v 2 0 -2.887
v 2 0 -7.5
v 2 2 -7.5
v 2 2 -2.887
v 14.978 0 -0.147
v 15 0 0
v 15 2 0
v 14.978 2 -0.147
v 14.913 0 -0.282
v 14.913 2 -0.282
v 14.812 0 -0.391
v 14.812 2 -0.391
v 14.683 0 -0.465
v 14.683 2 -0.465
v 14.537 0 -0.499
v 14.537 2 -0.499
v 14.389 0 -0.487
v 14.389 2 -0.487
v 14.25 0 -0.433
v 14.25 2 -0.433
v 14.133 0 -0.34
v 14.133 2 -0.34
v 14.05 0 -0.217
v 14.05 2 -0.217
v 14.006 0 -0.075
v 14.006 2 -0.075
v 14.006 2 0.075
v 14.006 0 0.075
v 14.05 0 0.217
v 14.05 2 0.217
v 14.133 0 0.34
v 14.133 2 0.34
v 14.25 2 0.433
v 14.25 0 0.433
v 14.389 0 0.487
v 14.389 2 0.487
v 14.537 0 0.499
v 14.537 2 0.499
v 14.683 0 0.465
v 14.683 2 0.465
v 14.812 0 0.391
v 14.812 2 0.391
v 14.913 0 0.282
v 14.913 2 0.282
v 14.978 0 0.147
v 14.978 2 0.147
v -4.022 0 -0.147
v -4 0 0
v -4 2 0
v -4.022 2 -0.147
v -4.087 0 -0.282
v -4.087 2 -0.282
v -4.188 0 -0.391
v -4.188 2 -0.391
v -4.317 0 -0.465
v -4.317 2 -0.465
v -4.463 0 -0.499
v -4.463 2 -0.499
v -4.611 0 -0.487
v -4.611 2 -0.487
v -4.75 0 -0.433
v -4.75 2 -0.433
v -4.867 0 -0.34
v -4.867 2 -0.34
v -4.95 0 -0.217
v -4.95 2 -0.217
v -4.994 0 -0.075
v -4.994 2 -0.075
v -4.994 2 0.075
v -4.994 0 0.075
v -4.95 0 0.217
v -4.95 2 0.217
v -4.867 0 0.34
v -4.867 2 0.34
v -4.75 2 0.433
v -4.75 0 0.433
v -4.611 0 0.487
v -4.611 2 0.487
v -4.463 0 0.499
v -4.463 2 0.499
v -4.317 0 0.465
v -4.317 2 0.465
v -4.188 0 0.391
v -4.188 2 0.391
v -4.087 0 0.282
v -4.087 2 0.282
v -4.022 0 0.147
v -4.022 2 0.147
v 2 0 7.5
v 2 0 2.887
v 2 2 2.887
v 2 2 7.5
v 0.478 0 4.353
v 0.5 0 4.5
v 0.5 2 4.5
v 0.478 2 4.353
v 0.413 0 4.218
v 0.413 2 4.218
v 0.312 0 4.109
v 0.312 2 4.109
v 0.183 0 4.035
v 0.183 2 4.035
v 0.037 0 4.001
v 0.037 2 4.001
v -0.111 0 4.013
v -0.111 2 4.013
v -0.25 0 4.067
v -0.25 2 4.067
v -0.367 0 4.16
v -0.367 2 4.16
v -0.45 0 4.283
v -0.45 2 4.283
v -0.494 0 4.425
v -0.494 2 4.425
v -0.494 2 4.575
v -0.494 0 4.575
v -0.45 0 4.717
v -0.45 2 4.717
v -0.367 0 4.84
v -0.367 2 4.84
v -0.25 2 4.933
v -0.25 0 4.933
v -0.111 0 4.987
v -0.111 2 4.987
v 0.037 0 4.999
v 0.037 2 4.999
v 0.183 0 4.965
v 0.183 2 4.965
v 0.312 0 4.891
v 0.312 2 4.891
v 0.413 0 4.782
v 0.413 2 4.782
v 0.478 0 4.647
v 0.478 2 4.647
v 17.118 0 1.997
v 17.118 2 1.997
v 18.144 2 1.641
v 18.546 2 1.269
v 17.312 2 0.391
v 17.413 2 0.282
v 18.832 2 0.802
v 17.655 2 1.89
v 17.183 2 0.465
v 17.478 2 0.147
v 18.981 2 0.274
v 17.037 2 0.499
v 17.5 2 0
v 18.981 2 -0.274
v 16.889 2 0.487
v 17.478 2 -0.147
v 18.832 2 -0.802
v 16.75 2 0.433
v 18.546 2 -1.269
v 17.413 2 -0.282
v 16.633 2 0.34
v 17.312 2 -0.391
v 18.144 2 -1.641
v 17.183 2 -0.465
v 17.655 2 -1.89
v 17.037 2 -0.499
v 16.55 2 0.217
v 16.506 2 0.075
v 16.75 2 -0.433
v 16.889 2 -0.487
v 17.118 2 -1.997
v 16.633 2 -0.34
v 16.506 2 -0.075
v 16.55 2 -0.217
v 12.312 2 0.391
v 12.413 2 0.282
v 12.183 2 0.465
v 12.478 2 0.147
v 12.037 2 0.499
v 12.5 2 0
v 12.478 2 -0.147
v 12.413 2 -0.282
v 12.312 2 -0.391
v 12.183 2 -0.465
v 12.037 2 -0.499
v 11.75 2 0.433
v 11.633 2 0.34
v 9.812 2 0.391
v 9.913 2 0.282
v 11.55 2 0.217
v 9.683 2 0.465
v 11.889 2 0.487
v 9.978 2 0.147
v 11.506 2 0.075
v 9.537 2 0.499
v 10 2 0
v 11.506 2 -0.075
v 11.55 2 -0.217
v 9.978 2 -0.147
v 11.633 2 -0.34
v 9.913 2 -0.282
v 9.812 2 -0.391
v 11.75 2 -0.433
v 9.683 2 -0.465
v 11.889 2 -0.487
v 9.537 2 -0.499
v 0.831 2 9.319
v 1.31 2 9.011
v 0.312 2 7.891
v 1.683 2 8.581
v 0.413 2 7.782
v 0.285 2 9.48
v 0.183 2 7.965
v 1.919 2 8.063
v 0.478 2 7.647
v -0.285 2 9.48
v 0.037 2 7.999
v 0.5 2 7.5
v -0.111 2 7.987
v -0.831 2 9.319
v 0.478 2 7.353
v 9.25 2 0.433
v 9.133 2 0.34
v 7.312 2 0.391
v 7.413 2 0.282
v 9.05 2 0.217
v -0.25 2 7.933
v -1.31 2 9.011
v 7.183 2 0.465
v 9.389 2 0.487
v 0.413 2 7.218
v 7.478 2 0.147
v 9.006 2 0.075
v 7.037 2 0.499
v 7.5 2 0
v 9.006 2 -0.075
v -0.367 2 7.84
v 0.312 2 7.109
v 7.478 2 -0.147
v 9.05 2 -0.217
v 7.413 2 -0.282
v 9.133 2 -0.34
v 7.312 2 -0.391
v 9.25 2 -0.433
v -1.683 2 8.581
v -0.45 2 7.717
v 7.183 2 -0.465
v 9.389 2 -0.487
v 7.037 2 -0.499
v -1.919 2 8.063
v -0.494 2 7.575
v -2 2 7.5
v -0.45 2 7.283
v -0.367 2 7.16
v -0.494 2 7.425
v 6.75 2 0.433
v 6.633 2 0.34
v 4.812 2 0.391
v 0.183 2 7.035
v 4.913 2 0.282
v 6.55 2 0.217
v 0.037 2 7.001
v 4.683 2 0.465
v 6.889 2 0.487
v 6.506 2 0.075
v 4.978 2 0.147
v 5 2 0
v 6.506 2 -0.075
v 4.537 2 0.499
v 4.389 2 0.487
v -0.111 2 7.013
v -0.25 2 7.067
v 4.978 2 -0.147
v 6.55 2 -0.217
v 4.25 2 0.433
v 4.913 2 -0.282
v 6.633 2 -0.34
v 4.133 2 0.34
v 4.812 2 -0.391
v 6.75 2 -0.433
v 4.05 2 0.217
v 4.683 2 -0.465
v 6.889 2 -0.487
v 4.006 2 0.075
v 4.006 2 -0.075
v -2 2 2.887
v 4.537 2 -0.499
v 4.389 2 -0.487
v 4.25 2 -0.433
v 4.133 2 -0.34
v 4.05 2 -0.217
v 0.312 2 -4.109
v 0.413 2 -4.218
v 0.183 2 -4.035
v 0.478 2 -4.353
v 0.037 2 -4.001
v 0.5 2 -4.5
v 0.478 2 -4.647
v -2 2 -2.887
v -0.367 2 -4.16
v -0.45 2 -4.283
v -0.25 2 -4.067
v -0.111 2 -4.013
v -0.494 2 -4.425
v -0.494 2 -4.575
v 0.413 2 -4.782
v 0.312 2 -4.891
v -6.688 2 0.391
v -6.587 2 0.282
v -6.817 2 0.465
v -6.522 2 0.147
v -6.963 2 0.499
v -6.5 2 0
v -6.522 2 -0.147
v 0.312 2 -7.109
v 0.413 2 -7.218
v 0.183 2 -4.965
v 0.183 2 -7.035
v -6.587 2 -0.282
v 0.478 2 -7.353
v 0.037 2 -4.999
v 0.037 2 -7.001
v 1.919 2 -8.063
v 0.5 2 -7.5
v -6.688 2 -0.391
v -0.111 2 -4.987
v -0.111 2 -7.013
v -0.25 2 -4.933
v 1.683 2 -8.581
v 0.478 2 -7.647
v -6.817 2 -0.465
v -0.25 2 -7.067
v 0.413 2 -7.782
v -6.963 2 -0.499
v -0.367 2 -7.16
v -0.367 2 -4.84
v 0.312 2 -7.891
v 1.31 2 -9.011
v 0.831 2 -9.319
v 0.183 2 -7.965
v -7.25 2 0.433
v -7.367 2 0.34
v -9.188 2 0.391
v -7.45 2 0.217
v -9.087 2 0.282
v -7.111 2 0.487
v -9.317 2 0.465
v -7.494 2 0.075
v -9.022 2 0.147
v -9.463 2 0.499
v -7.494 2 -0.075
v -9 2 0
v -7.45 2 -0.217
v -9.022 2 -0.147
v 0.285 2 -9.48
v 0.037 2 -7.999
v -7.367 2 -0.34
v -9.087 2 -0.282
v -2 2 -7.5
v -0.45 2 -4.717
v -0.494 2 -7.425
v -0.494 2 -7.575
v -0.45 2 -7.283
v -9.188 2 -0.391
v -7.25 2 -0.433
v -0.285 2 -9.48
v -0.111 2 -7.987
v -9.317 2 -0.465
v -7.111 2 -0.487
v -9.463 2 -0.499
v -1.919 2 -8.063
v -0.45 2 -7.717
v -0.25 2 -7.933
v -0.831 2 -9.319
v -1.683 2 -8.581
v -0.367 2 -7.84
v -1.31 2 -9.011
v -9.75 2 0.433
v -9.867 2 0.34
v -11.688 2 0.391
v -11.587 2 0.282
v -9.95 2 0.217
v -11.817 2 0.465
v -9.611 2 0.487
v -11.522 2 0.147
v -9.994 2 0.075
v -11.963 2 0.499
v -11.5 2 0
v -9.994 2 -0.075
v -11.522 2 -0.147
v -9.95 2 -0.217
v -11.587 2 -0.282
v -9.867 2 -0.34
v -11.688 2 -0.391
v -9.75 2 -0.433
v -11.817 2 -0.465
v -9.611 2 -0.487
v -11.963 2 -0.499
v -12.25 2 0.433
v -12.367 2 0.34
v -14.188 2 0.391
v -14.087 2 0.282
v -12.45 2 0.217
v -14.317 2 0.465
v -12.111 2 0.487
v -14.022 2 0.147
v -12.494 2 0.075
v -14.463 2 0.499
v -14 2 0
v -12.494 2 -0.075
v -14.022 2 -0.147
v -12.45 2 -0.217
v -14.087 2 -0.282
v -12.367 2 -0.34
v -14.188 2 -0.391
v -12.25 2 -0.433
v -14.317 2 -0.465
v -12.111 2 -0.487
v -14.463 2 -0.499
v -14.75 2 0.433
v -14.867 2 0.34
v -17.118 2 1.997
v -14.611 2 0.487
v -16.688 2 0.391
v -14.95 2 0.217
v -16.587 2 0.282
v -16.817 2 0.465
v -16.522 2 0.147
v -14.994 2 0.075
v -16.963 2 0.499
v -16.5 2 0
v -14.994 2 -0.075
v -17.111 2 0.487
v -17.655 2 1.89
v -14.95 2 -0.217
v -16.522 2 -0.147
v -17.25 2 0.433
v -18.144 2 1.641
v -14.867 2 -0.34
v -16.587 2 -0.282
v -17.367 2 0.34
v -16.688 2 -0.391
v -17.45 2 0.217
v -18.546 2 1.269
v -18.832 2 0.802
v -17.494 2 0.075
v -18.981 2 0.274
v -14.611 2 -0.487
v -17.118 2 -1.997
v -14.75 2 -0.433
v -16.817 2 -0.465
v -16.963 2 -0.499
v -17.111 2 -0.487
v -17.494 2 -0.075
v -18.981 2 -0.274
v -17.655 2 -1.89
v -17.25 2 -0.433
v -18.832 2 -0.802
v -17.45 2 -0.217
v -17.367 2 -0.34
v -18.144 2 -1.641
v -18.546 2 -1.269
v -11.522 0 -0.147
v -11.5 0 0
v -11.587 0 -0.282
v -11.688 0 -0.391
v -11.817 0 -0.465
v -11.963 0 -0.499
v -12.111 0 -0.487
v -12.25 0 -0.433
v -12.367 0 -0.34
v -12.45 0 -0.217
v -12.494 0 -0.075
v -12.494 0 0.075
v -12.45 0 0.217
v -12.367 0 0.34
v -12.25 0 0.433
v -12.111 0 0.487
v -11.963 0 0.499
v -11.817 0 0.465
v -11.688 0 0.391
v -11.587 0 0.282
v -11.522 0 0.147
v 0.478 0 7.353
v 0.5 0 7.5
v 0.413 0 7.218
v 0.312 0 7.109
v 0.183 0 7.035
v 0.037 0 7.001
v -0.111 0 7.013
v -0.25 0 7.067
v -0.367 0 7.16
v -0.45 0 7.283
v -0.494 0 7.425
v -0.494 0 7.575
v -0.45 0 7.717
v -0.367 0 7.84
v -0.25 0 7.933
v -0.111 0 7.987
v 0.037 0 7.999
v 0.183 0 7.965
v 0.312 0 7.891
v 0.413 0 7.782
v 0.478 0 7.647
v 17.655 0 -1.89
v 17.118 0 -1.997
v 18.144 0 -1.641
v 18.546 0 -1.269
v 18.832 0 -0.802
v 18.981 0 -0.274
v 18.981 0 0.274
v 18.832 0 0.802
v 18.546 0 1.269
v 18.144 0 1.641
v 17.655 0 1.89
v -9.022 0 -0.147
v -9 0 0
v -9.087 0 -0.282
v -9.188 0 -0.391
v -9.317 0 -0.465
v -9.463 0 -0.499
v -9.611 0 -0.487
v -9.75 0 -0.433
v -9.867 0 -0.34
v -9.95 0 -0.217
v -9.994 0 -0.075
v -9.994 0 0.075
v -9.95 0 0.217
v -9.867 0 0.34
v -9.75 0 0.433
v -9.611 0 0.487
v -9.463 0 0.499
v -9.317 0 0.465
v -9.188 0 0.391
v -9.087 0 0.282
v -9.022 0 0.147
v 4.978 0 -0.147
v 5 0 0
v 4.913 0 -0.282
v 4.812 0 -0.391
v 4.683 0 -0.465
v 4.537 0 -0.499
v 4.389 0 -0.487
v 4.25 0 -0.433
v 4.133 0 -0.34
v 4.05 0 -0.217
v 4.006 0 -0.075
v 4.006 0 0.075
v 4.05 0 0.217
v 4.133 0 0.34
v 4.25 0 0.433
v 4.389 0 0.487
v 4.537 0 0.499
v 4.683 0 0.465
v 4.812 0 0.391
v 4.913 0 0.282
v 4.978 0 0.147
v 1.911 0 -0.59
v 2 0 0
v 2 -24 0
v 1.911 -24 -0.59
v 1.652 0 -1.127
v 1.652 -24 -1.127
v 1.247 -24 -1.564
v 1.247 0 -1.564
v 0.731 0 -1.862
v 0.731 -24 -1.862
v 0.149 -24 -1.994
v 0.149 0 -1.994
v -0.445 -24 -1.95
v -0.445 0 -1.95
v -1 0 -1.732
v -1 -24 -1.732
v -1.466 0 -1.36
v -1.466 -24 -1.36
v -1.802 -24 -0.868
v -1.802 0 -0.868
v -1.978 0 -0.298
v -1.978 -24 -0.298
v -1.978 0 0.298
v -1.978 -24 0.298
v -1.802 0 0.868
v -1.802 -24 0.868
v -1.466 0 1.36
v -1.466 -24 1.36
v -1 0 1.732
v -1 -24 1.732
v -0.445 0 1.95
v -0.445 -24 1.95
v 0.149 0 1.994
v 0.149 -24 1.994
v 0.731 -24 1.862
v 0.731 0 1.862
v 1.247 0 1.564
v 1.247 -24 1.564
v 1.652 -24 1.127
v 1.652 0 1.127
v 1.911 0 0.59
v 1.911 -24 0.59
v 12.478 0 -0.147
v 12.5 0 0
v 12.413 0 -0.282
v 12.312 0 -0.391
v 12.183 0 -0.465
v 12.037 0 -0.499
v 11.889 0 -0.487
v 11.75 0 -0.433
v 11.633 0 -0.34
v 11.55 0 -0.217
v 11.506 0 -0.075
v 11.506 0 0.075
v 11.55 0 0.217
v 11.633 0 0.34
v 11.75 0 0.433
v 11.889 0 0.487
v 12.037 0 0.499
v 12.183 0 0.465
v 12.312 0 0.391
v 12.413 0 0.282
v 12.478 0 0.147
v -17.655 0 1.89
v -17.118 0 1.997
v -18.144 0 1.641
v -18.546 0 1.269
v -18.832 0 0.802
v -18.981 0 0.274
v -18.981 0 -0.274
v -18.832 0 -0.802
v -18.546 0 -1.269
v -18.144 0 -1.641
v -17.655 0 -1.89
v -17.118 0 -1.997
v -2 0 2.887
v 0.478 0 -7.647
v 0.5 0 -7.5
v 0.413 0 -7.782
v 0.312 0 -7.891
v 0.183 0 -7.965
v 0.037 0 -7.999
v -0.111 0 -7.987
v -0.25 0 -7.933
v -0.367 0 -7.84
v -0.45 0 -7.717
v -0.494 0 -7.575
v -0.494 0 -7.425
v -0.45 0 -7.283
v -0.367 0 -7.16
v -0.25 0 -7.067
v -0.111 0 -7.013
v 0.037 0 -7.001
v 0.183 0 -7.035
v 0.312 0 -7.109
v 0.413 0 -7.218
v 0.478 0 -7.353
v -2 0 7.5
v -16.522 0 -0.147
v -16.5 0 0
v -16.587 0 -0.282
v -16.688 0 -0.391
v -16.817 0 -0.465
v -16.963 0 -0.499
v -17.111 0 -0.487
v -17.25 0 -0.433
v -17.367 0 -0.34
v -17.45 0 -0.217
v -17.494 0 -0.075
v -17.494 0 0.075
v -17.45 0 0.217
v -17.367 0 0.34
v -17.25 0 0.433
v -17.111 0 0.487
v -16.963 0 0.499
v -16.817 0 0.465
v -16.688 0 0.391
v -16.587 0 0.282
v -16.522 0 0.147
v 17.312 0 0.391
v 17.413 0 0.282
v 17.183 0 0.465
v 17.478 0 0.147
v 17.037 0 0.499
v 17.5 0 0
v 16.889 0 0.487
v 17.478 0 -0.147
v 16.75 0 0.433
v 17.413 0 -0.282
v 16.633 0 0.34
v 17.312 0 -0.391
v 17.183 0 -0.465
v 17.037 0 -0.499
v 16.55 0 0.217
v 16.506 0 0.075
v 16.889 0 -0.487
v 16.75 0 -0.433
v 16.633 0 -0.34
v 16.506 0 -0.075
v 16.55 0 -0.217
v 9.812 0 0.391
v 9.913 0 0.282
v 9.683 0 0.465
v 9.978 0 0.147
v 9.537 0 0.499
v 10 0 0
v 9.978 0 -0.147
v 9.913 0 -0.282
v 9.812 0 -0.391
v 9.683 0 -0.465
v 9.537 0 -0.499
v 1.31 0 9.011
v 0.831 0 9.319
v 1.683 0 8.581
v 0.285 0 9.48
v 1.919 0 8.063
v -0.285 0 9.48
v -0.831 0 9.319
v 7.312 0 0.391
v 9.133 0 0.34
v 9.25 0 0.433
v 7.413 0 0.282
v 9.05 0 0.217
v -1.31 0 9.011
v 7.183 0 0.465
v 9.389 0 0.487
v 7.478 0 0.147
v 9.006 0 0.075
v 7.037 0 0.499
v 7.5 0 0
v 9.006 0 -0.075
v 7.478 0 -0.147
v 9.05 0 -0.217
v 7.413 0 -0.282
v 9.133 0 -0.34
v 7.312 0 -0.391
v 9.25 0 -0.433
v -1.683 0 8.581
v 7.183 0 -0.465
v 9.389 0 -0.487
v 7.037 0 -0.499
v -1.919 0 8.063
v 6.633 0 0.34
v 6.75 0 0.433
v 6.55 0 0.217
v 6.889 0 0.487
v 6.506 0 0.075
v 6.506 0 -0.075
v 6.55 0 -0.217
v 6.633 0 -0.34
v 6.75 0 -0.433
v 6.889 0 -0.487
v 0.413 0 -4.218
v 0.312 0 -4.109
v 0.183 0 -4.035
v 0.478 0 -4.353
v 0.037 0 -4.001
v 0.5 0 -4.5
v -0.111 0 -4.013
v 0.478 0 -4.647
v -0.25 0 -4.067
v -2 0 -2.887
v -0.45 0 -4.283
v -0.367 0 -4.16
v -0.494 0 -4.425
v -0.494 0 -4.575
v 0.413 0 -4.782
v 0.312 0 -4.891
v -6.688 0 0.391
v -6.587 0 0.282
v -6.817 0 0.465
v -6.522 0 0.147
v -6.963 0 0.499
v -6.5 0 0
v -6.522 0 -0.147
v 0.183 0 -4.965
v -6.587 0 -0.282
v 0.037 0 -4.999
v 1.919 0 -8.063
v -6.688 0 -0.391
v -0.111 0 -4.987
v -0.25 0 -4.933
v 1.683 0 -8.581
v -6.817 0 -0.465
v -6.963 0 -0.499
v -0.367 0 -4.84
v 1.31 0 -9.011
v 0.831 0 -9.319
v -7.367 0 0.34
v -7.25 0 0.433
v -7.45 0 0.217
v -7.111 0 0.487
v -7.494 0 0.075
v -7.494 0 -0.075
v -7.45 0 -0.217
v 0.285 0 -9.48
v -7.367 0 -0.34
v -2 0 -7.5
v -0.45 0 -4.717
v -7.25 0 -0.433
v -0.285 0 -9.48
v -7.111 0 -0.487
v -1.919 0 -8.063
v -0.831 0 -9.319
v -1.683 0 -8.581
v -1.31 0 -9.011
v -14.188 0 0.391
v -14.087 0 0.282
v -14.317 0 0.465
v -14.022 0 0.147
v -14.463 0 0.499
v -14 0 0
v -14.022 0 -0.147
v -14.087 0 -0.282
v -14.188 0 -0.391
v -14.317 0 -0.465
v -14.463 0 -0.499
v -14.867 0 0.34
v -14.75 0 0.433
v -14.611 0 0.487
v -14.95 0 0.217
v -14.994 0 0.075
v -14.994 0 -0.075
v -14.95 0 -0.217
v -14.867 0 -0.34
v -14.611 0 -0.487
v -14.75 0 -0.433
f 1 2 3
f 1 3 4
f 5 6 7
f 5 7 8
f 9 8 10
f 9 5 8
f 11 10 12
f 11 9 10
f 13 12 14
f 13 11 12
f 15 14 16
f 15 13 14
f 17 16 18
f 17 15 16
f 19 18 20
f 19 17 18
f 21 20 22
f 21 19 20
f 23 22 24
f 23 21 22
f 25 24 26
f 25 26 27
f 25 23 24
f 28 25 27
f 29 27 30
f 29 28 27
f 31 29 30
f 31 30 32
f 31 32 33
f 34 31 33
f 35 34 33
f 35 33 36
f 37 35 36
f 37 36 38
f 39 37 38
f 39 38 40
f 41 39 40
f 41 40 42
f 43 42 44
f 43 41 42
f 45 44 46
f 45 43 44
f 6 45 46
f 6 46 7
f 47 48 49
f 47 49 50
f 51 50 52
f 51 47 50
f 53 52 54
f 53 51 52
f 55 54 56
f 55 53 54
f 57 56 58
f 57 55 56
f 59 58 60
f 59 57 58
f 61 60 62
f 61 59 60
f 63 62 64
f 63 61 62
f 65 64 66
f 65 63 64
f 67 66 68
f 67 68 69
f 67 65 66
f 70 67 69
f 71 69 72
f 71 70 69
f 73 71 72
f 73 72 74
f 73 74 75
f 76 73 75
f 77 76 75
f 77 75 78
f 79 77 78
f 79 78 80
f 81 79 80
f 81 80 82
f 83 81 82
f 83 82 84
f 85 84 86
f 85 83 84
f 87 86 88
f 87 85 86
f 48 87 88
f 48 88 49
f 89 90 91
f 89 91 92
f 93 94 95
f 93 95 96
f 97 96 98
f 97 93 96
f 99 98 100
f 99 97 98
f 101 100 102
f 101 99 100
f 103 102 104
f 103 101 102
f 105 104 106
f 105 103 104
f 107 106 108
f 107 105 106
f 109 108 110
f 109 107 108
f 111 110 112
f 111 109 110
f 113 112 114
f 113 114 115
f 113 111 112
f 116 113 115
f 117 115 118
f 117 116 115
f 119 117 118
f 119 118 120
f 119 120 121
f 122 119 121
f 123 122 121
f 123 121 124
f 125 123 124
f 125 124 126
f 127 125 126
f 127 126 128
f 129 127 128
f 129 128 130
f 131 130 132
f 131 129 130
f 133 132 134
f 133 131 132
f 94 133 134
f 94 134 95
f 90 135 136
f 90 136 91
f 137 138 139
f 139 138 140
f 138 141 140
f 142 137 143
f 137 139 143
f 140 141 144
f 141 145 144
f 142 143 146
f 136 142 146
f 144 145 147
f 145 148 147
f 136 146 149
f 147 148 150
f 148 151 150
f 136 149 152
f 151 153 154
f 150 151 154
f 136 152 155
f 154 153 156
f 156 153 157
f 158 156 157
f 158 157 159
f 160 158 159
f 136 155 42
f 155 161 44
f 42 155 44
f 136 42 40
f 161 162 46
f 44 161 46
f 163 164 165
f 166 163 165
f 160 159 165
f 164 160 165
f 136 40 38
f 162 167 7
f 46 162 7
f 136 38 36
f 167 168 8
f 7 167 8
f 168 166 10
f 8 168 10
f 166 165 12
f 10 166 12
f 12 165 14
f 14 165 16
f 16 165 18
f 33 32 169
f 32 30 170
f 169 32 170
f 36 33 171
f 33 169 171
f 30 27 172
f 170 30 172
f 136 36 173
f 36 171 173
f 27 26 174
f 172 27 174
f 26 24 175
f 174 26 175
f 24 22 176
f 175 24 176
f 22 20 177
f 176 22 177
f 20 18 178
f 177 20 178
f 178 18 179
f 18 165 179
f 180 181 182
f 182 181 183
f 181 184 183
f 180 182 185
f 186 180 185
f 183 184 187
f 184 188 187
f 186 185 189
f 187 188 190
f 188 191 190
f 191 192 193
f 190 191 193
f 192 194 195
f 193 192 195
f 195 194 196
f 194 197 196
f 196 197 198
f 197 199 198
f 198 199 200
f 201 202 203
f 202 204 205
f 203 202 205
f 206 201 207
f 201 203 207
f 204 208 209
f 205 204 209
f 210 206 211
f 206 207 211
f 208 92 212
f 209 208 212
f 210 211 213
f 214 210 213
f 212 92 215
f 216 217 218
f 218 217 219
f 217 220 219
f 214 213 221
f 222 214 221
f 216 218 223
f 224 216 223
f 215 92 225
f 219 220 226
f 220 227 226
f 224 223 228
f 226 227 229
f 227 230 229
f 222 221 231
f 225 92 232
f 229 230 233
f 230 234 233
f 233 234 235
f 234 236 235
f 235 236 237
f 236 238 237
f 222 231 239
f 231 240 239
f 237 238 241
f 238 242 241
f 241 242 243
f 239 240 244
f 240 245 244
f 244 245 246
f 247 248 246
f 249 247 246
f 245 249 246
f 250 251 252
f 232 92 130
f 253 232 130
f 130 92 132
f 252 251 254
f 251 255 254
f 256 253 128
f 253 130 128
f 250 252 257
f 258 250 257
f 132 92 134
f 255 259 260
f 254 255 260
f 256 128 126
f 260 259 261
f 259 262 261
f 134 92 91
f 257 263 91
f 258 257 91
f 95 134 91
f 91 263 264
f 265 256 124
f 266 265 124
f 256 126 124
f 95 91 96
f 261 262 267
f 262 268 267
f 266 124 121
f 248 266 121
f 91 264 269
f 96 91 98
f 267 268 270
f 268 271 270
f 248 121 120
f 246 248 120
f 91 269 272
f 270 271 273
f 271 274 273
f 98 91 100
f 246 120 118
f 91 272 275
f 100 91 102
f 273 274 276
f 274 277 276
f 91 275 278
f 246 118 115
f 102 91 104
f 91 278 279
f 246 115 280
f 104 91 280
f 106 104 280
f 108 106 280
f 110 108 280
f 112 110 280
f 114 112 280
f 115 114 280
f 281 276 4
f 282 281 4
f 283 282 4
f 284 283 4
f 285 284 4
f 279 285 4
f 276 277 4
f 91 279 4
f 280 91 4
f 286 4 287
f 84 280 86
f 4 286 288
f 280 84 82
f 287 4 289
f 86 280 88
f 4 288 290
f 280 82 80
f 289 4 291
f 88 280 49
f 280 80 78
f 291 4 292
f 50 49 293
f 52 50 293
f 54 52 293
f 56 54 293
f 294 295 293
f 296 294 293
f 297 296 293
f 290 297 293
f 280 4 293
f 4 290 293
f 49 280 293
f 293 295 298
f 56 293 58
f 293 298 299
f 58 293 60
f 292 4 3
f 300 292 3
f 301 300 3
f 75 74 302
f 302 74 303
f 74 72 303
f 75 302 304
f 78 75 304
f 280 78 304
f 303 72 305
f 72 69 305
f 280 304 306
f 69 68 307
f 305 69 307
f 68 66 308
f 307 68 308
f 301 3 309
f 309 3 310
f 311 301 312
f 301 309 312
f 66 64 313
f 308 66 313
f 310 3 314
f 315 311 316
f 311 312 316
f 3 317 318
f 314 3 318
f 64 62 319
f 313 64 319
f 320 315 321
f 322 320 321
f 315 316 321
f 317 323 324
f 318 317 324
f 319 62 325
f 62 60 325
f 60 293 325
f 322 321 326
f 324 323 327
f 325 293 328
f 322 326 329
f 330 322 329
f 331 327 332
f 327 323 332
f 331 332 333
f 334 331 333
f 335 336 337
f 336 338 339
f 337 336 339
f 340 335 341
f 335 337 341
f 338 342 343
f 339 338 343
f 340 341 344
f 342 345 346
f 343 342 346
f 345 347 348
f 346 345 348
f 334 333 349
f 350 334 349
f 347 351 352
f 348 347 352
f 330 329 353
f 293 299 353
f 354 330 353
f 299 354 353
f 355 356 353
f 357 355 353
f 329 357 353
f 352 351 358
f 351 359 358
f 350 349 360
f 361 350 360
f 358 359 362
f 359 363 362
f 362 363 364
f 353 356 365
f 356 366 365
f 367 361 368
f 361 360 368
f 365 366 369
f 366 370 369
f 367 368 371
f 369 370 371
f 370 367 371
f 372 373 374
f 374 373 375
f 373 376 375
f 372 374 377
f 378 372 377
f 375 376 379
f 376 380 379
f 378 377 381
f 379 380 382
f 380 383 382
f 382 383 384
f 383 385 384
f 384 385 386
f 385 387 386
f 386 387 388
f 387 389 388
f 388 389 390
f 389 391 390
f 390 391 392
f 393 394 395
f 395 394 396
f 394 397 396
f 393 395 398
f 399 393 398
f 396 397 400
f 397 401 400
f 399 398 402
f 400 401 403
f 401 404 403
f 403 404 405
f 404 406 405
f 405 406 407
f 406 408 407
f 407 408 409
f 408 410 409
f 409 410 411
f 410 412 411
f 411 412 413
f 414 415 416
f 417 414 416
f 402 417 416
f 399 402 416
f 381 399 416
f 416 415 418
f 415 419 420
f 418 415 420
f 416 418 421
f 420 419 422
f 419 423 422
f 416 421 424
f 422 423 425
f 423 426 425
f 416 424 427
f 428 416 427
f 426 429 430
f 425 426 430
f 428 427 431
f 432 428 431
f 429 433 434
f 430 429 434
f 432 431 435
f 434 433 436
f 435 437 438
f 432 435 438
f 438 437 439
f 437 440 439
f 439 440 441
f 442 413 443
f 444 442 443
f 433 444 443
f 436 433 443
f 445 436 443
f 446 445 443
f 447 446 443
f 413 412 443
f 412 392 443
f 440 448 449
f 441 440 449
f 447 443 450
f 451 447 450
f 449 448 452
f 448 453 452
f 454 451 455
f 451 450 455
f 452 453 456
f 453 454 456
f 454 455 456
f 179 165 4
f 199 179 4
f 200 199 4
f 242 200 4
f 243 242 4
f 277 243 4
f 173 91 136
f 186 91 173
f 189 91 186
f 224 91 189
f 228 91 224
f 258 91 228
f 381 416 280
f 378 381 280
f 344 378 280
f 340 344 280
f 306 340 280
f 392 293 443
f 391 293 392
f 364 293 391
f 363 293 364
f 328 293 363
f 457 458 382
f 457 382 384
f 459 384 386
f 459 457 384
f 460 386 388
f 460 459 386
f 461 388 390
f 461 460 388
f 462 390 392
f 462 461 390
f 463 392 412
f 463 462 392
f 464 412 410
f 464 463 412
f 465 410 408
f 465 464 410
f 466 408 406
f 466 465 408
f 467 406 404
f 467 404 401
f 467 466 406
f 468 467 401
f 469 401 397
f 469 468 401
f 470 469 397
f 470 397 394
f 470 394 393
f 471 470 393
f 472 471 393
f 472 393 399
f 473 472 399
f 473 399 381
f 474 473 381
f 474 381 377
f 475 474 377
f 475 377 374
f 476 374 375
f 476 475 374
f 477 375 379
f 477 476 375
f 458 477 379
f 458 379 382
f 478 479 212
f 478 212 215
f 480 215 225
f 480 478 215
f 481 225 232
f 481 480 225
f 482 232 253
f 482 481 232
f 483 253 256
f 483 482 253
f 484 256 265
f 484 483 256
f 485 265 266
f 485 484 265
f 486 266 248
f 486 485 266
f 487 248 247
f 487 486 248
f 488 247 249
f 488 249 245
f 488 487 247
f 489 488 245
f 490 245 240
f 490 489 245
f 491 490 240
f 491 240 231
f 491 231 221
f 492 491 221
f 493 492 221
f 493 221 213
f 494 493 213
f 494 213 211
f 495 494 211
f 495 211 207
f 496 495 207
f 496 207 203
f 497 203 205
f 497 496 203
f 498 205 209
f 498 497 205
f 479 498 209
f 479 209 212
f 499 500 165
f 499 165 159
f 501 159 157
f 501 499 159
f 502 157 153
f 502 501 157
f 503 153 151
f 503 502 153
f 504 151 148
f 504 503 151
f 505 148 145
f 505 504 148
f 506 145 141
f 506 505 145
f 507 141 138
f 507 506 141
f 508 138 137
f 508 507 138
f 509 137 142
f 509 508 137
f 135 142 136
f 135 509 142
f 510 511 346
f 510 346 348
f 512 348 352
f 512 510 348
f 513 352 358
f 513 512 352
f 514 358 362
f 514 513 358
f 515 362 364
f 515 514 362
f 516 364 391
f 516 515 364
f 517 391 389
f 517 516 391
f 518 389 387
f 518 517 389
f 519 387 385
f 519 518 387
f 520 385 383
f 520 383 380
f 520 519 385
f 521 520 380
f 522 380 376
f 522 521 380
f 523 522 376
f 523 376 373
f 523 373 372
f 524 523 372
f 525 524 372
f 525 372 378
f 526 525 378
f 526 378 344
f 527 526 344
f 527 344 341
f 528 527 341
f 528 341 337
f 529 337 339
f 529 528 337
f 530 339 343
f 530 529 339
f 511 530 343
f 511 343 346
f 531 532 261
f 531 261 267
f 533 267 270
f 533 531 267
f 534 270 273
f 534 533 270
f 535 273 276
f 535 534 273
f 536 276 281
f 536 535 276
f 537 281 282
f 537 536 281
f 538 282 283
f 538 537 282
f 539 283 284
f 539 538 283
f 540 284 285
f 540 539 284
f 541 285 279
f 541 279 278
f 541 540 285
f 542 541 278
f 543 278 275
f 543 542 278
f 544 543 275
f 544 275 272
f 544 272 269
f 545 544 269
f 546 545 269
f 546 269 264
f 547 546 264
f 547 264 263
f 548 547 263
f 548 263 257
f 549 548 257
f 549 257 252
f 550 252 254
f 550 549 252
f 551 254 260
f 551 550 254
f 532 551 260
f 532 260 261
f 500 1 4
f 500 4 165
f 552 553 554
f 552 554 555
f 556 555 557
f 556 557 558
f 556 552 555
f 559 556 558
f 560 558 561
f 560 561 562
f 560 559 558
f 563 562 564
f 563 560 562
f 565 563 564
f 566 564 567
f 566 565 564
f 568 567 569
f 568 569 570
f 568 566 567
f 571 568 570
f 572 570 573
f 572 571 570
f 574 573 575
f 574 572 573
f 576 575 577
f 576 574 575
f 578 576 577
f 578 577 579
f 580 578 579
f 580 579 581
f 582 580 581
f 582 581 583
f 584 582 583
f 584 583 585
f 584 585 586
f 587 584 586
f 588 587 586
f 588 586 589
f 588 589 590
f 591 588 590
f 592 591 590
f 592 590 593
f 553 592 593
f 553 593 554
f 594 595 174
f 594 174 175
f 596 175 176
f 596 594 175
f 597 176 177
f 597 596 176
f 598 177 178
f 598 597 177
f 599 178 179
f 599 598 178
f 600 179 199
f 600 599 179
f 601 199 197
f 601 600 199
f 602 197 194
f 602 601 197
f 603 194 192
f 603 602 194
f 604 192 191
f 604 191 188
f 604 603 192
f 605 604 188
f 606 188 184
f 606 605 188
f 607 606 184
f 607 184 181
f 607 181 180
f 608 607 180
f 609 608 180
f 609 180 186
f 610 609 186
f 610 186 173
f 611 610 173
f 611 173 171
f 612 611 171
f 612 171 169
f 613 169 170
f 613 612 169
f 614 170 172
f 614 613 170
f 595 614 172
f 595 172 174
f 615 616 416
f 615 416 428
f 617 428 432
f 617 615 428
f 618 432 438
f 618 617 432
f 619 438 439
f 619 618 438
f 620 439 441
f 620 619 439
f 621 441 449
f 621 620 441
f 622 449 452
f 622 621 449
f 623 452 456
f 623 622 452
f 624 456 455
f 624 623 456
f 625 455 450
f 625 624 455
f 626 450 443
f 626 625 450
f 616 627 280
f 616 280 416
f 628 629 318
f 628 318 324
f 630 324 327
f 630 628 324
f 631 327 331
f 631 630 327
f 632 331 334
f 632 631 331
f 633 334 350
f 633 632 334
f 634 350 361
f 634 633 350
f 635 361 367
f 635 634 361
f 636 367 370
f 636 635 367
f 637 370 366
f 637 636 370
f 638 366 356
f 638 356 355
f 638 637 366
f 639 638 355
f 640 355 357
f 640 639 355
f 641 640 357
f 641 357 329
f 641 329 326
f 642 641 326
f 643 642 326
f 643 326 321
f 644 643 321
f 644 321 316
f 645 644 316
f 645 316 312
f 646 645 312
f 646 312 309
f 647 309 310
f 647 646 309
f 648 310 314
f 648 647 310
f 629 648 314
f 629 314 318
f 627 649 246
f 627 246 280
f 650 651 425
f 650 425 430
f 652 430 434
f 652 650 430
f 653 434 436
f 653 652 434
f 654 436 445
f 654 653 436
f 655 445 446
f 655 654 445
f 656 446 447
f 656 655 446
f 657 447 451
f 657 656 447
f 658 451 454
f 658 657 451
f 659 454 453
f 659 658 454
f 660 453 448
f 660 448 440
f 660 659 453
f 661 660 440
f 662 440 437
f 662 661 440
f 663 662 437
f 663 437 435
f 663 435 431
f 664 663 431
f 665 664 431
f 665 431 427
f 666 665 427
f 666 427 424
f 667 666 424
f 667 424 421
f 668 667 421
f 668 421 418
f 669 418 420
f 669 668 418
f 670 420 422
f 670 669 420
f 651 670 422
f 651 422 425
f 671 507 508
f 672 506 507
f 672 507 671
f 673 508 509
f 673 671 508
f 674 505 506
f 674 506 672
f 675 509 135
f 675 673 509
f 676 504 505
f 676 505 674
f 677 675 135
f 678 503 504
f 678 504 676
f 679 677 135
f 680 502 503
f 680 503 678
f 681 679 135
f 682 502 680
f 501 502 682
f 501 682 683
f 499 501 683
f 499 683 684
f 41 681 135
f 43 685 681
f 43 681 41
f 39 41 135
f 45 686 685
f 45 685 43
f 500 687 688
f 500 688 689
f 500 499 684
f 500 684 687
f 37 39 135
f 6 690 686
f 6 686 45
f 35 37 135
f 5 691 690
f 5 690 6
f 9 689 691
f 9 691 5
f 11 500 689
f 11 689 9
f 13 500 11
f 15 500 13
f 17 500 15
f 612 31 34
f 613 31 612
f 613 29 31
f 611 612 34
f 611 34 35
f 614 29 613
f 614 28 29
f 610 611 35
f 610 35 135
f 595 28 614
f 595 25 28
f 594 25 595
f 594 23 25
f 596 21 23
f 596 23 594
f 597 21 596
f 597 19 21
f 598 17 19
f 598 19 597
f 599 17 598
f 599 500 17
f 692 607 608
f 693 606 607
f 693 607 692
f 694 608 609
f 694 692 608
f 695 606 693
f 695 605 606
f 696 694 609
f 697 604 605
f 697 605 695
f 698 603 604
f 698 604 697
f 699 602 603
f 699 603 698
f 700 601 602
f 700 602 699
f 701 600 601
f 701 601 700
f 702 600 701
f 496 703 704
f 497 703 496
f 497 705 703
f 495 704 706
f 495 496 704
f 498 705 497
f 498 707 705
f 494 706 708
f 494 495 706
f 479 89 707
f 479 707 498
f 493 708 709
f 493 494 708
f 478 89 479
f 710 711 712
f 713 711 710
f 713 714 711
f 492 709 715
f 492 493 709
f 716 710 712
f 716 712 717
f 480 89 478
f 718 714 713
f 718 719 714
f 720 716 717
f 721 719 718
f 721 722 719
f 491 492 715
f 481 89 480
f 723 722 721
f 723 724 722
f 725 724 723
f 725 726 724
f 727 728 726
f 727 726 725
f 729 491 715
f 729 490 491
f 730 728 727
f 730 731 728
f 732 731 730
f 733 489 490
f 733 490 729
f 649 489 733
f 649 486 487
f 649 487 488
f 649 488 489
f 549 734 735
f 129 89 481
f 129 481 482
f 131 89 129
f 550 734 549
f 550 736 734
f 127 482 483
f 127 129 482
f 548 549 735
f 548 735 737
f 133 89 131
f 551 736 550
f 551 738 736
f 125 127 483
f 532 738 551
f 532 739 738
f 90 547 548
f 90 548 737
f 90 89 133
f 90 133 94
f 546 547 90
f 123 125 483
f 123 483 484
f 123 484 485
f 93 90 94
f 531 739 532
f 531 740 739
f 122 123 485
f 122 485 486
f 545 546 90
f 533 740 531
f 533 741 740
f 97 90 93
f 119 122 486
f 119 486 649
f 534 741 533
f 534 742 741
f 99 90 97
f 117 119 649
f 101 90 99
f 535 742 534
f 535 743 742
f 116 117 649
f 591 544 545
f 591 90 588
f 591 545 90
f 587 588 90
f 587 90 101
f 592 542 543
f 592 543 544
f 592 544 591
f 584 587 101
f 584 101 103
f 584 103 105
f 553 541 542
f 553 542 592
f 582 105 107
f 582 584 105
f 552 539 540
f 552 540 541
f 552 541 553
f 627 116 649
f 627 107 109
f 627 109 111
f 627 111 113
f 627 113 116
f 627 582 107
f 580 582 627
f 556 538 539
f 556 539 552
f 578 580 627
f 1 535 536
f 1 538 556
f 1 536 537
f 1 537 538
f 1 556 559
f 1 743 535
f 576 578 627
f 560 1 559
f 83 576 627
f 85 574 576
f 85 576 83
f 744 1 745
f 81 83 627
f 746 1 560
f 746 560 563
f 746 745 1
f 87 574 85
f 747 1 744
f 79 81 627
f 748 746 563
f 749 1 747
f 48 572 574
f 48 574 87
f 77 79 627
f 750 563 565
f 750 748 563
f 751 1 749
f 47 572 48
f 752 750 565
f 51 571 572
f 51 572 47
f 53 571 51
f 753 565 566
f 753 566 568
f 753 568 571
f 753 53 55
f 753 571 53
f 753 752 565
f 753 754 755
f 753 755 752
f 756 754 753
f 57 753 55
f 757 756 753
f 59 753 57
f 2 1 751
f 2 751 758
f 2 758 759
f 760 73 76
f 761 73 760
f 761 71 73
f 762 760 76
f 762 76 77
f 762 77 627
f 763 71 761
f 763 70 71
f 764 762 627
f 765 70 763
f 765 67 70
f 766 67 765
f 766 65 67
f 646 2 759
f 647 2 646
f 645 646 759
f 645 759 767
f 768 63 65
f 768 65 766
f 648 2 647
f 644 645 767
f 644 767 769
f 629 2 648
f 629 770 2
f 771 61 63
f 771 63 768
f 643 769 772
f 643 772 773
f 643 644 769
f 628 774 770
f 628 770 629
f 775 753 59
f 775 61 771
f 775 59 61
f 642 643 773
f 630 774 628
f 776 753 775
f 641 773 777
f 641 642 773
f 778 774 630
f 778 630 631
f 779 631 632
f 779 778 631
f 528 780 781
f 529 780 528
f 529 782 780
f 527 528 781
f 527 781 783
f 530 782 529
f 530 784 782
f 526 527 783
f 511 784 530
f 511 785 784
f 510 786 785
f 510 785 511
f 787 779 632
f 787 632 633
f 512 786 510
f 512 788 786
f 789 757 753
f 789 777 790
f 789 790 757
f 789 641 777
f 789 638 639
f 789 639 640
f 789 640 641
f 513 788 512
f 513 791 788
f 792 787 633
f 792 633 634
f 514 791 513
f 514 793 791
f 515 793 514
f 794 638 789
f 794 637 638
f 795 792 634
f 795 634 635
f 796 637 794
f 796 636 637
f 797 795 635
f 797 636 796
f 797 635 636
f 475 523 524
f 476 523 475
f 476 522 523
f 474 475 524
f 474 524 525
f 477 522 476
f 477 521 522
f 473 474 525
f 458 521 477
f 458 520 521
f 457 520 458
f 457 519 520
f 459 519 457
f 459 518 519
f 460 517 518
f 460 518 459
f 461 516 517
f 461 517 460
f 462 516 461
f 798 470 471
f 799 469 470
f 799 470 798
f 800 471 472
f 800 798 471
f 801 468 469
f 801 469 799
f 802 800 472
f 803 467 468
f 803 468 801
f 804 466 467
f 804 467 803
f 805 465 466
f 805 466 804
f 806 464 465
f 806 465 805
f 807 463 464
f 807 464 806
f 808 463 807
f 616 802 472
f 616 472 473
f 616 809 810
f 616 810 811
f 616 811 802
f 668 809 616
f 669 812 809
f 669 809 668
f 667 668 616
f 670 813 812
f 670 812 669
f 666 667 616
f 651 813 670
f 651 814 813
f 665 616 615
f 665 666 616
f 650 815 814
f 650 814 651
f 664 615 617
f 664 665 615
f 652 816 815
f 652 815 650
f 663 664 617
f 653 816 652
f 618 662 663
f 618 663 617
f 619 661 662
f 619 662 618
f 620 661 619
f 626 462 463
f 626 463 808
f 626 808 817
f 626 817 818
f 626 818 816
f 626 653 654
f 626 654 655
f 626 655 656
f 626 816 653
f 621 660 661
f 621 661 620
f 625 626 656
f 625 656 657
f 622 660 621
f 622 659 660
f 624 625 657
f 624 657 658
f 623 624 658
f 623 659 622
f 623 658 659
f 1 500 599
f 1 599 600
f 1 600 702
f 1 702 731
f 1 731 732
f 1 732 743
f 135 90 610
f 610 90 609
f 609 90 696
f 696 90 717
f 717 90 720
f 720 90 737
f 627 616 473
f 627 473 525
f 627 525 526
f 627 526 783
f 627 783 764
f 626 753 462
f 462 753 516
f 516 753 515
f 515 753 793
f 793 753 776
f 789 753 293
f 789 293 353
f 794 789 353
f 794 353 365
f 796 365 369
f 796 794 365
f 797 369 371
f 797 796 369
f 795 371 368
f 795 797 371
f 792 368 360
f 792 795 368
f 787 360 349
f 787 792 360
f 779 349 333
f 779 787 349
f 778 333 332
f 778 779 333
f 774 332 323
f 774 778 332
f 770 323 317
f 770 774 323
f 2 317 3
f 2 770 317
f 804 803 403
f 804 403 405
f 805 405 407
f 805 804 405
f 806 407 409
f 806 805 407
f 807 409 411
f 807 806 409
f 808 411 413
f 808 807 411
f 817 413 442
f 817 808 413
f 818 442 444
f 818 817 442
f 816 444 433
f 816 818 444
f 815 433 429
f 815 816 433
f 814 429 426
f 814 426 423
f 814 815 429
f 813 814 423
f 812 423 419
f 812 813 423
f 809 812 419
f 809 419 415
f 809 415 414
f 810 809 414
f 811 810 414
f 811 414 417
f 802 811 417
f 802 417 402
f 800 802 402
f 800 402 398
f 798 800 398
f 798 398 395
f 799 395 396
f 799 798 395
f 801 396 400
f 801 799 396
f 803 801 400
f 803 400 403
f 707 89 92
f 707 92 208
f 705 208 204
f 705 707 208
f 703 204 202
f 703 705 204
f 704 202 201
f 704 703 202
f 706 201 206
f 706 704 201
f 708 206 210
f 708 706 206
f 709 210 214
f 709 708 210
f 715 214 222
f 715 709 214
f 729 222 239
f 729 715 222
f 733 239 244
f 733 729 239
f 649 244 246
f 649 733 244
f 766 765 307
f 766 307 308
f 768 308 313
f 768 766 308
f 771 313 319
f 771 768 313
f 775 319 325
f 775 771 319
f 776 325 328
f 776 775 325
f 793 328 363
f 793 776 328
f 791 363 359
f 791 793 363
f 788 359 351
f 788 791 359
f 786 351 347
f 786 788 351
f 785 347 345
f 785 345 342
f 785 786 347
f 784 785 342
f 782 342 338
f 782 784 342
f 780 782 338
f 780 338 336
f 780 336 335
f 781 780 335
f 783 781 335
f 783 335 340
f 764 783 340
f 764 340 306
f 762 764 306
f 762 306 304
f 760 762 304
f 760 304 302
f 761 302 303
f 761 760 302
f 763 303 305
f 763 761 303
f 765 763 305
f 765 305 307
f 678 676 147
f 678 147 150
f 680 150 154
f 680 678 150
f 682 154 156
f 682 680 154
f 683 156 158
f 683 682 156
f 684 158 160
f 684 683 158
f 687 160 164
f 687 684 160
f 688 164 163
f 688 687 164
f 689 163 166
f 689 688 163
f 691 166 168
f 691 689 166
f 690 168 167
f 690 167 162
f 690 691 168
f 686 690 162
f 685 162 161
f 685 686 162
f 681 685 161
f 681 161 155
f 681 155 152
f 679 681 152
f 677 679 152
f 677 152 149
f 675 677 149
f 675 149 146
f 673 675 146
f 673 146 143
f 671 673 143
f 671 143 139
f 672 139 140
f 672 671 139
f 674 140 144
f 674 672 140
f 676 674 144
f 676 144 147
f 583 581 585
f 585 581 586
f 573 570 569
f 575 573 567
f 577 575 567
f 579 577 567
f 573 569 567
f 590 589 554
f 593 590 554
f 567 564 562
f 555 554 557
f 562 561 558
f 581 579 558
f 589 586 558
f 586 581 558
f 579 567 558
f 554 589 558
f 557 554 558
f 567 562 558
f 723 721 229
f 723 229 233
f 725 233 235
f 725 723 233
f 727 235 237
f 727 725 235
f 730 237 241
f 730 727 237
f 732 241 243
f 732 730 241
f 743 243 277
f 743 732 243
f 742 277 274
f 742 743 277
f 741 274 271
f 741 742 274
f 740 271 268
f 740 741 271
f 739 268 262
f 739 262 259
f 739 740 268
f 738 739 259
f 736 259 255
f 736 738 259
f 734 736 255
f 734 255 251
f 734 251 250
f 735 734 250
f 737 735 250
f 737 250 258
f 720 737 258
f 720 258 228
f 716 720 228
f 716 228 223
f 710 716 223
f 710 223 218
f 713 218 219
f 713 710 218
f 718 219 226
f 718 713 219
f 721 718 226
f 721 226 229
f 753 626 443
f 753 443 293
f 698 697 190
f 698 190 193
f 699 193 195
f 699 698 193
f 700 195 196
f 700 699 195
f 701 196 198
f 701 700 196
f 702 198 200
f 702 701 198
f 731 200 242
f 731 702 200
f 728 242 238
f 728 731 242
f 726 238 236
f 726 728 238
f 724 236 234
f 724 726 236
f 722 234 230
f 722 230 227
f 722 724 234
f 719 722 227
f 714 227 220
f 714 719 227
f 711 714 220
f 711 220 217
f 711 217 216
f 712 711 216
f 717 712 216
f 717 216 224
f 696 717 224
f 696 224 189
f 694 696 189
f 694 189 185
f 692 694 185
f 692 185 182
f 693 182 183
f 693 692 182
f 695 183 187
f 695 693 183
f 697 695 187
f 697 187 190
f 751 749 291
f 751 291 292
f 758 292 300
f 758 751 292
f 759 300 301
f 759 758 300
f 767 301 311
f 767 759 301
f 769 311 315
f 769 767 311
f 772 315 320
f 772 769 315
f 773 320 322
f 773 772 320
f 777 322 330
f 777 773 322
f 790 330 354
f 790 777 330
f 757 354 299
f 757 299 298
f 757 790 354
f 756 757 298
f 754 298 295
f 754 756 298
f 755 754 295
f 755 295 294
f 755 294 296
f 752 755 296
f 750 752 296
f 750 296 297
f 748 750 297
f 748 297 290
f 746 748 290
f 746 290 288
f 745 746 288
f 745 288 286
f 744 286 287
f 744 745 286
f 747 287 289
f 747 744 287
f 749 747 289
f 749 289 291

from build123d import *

# Parameters (mm, degrees)
SKETCH1_R           = 2
SKETCH1_R_2         = 0.5
BOSS_EXTRUDE1_DEPTH = 2
BOSS_EXTRUDE2_START = 2
SKETCH1_3_R         = 2
BOSS_EXTRUDE2_DEPTH = 26


with BuildPart() as part:
    # Sketch1 → Boss-Extrude1 (new body)
    with BuildSketch(Plane(origin=(0, 0, 0), x_dir=(1, 0, 0), z_dir=(0, 1, 0))):
        with BuildLine():
            Line((2, 7.5), (2, 2.88735269))
            Line((2, 2.88735269), (17.117647059, 1.996536794))
            ThreePointArc((17.117647059, 1.996536794), (19, 0), (17.117647059, -1.996536794))
            Line((17.117647059, -1.996536794), (2, -2.88735269))
            Line((2, -2.88735269), (2, -7.5))
            ThreePointArc((2, -7.5), (0, -9.5), (-2, -7.5))
            Line((-2, -7.5), (-2, -2.88735269))
            Line((-2, -2.88735269), (-17.117647059, -1.996536794))
            ThreePointArc((-17.117647059, -1.996536794), (-19, 0), (-17.117647059, 1.996536794))
            Line((-17.117647059, 1.996536794), (-2, 2.88735269))
            Line((-2, 2.88735269), (-2, 7.5))
            ThreePointArc((-2, 7.5), (0, 9.5), (2, 7.5))
        make_face()
        Circle(SKETCH1_R, mode=Mode.SUBTRACT)
        with Locations((-17, 0)):
            Circle(SKETCH1_R_2, mode=Mode.SUBTRACT)
        with Locations((17, 0)):
            Circle(SKETCH1_R_2, mode=Mode.SUBTRACT)
        with Locations((-14.5, 0)):
            Circle(SKETCH1_R_2, mode=Mode.SUBTRACT)
        with Locations((-12, 0)):
            Circle(SKETCH1_R_2, mode=Mode.SUBTRACT)
        with Locations((-9.5, 0)):
            Circle(SKETCH1_R_2, mode=Mode.SUBTRACT)
        with Locations((-7, 0)):
            Circle(SKETCH1_R_2, mode=Mode.SUBTRACT)
        with Locations((-4.5, 0)):
            Circle(SKETCH1_R_2, mode=Mode.SUBTRACT)
        with Locations((4.5, 0)):
            Circle(SKETCH1_R_2, mode=Mode.SUBTRACT)
        with Locations((7, 0)):
            Circle(SKETCH1_R_2, mode=Mode.SUBTRACT)
        with Locations((9.5, 0)):
            Circle(SKETCH1_R_2, mode=Mode.SUBTRACT)
        with Locations((12, 0)):
            Circle(SKETCH1_R_2, mode=Mode.SUBTRACT)
        with Locations((14.5, 0)):
            Circle(SKETCH1_R_2, mode=Mode.SUBTRACT)
        with Locations((0, 7.5)):
            Circle(SKETCH1_R_2, mode=Mode.SUBTRACT)
        with Locations((0, 4.5)):
            Circle(SKETCH1_R_2, mode=Mode.SUBTRACT)
        with Locations((0, -4.5)):
            Circle(SKETCH1_R_2, mode=Mode.SUBTRACT)
        with Locations((0, -7.5)):
            Circle(SKETCH1_R_2, mode=Mode.SUBTRACT)
    extrude(amount=BOSS_EXTRUDE1_DEPTH)

    # Sketch1_3 → Boss-Extrude2 (add)
    with BuildSketch(Plane(origin=(0, 0, 0), x_dir=(1, 0, 0), z_dir=(0, 1, 0)).offset(BOSS_EXTRUDE2_START)):
        Circle(SKETCH1_3_R)
    extrude(amount=-BOSS_EXTRUDE2_DEPTH)


solid = part.part
